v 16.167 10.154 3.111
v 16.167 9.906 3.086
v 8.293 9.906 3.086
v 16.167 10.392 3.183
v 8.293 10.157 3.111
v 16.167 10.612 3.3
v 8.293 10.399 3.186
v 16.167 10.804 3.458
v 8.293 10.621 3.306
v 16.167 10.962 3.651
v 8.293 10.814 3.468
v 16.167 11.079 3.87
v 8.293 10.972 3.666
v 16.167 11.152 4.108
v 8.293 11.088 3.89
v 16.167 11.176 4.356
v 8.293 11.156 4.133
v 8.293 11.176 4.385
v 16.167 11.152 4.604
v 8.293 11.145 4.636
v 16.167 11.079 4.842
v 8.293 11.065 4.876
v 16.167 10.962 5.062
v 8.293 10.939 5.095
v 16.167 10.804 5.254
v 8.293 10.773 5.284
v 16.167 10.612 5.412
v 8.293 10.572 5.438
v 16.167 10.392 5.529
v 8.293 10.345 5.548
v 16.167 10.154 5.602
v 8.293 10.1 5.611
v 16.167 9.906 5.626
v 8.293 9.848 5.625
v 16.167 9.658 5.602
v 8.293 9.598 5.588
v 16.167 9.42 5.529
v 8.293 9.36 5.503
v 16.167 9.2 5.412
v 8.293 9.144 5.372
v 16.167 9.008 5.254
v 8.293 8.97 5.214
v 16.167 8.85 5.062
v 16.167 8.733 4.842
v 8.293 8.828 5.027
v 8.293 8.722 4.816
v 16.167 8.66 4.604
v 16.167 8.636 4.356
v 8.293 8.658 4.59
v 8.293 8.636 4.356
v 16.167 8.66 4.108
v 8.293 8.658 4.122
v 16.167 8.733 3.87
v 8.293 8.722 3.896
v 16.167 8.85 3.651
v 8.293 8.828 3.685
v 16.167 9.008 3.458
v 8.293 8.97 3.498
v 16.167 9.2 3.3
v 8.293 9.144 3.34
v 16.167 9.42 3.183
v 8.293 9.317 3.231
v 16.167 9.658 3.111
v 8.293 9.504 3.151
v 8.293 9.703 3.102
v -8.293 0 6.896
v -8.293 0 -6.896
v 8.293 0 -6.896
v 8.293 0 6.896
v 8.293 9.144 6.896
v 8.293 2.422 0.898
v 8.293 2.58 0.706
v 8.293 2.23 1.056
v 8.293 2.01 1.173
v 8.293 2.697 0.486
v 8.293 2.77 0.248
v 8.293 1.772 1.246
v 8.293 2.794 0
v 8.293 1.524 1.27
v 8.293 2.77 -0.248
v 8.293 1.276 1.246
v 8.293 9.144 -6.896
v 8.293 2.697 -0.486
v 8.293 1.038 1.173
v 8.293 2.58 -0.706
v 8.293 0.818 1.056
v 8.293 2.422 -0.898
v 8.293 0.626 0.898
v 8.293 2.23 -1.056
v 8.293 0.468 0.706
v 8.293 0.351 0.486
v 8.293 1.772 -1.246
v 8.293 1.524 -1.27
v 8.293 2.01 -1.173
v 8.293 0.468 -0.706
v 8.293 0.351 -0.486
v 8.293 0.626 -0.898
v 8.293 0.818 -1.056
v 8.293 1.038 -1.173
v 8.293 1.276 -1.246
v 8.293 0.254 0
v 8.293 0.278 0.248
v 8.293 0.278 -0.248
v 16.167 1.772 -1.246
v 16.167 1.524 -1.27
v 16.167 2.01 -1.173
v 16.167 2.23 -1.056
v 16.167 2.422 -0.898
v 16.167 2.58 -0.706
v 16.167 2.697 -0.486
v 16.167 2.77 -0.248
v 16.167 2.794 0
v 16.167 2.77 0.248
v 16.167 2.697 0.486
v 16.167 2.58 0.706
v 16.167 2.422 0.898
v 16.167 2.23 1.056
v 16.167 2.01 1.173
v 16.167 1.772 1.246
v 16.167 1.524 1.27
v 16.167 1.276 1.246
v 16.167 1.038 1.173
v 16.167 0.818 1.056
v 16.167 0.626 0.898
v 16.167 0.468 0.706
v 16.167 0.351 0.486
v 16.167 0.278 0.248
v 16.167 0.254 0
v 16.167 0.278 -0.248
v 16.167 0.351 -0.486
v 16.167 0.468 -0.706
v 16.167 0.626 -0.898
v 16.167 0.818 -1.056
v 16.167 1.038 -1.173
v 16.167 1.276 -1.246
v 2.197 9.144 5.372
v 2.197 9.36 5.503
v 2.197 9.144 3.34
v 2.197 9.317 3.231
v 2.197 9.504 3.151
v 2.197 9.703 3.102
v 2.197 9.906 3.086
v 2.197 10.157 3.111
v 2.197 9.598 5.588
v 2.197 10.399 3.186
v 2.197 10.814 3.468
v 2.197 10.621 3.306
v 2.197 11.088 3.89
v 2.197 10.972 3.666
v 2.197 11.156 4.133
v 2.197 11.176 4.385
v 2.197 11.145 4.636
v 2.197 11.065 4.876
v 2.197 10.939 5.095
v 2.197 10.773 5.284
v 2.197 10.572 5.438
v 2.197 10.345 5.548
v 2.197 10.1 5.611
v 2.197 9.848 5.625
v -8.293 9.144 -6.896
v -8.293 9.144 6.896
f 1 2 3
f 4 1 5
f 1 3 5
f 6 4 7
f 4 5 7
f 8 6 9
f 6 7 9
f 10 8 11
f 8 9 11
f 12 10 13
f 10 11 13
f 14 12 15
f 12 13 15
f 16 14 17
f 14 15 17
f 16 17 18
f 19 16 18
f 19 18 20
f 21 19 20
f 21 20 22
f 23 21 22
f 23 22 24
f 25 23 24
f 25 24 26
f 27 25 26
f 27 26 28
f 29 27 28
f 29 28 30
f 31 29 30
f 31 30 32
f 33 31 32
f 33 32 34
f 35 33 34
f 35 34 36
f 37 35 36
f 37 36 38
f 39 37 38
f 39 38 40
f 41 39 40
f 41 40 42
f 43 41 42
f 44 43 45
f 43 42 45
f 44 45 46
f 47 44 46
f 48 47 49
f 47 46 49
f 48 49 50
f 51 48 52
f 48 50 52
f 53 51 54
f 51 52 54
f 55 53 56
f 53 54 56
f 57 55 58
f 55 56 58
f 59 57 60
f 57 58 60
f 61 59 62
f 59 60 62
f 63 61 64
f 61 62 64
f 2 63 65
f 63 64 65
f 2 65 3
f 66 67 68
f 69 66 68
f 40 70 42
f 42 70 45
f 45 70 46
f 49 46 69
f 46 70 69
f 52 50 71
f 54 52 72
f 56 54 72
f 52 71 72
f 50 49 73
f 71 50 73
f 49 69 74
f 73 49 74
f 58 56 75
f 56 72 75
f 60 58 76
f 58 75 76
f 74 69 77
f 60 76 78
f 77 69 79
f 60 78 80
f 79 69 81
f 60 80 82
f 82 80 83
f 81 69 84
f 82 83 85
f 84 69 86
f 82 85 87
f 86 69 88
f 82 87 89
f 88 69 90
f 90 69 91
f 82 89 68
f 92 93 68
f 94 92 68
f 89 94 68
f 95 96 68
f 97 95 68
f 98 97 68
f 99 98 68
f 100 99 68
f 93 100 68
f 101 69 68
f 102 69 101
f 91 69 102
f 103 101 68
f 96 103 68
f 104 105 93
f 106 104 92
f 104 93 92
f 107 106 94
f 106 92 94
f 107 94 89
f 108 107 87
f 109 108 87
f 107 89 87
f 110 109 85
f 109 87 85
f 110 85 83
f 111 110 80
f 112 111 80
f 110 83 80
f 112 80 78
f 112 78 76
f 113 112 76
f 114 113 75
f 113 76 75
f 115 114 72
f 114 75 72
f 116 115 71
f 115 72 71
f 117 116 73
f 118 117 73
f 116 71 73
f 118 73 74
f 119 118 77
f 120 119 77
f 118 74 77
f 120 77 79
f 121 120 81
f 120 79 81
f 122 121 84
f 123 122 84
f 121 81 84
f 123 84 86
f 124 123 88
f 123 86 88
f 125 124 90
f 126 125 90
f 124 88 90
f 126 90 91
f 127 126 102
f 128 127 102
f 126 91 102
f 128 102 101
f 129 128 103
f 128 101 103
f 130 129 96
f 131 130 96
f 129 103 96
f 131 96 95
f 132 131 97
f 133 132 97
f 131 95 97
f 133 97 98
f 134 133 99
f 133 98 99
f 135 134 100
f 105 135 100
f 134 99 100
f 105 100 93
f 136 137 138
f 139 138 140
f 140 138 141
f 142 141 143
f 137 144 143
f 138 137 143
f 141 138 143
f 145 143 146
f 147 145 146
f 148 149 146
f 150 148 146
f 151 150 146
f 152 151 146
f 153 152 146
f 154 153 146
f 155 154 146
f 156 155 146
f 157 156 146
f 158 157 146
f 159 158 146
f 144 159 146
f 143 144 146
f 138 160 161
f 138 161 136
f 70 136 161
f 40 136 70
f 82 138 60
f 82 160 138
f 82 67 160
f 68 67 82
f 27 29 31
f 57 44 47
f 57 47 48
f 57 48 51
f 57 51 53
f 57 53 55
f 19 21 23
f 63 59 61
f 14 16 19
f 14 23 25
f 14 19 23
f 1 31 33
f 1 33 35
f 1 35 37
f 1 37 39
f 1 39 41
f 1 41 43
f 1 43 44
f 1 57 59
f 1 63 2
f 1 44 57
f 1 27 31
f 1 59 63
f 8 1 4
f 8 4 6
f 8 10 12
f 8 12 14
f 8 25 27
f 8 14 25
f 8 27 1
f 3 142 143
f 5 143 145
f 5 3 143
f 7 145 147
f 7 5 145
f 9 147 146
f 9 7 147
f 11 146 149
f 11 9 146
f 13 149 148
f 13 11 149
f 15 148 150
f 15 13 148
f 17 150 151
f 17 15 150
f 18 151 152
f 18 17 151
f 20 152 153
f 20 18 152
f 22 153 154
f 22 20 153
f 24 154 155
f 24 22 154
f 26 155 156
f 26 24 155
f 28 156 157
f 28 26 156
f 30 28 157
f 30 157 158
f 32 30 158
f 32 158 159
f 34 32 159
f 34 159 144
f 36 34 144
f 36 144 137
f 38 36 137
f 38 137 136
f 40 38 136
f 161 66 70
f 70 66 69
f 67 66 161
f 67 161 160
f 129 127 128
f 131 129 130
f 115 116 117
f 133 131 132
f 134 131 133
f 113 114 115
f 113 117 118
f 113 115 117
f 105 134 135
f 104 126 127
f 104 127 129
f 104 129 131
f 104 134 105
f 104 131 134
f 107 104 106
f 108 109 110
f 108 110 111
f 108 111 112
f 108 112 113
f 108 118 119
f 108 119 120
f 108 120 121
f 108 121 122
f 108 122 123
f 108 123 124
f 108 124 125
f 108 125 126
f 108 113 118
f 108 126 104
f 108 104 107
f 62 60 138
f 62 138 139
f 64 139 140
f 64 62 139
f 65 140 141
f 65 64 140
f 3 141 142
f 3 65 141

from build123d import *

# Parameters (mm, degrees)
SKETCH1_W                = 16.5862
SKETCH1_H                = 13.7922
BOSS_EXTRUDE1_DEPTH      = 9.144
SKETCH2_R                = 1.27
BOSS_EXTRUDE2_DEPTH      = 7.874
BOSS_EXTRUDE2_DEPTH_BACK = 6.096


with BuildPart() as part:
    # Sketch1 → Boss-Extrude1 (new body)
    with BuildSketch(Plane(origin=(0, 0, 0), x_dir=(1, 0, 0), z_dir=(0, 1, 0))):
        Rectangle(SKETCH1_W, SKETCH1_H)
    extrude(amount=BOSS_EXTRUDE1_DEPTH)

    # Sketch2 → Boss-Extrude2 (add, two sides)
    with BuildSketch(Plane(origin=(8.2931, 0, 0), x_dir=(0, 0, -1), z_dir=(1, 0, 0))) as boss_extrude2_sk:
        with Locations((0, 1.524)):
            Circle(SKETCH2_R)
        with Locations((-4.3561, 9.906)):
            Circle(SKETCH2_R)
    extrude(amount=BOSS_EXTRUDE2_DEPTH)
    extrude(boss_extrude2_sk.sketch, amount=-BOSS_EXTRUDE2_DEPTH_BACK)


solid = part.part
